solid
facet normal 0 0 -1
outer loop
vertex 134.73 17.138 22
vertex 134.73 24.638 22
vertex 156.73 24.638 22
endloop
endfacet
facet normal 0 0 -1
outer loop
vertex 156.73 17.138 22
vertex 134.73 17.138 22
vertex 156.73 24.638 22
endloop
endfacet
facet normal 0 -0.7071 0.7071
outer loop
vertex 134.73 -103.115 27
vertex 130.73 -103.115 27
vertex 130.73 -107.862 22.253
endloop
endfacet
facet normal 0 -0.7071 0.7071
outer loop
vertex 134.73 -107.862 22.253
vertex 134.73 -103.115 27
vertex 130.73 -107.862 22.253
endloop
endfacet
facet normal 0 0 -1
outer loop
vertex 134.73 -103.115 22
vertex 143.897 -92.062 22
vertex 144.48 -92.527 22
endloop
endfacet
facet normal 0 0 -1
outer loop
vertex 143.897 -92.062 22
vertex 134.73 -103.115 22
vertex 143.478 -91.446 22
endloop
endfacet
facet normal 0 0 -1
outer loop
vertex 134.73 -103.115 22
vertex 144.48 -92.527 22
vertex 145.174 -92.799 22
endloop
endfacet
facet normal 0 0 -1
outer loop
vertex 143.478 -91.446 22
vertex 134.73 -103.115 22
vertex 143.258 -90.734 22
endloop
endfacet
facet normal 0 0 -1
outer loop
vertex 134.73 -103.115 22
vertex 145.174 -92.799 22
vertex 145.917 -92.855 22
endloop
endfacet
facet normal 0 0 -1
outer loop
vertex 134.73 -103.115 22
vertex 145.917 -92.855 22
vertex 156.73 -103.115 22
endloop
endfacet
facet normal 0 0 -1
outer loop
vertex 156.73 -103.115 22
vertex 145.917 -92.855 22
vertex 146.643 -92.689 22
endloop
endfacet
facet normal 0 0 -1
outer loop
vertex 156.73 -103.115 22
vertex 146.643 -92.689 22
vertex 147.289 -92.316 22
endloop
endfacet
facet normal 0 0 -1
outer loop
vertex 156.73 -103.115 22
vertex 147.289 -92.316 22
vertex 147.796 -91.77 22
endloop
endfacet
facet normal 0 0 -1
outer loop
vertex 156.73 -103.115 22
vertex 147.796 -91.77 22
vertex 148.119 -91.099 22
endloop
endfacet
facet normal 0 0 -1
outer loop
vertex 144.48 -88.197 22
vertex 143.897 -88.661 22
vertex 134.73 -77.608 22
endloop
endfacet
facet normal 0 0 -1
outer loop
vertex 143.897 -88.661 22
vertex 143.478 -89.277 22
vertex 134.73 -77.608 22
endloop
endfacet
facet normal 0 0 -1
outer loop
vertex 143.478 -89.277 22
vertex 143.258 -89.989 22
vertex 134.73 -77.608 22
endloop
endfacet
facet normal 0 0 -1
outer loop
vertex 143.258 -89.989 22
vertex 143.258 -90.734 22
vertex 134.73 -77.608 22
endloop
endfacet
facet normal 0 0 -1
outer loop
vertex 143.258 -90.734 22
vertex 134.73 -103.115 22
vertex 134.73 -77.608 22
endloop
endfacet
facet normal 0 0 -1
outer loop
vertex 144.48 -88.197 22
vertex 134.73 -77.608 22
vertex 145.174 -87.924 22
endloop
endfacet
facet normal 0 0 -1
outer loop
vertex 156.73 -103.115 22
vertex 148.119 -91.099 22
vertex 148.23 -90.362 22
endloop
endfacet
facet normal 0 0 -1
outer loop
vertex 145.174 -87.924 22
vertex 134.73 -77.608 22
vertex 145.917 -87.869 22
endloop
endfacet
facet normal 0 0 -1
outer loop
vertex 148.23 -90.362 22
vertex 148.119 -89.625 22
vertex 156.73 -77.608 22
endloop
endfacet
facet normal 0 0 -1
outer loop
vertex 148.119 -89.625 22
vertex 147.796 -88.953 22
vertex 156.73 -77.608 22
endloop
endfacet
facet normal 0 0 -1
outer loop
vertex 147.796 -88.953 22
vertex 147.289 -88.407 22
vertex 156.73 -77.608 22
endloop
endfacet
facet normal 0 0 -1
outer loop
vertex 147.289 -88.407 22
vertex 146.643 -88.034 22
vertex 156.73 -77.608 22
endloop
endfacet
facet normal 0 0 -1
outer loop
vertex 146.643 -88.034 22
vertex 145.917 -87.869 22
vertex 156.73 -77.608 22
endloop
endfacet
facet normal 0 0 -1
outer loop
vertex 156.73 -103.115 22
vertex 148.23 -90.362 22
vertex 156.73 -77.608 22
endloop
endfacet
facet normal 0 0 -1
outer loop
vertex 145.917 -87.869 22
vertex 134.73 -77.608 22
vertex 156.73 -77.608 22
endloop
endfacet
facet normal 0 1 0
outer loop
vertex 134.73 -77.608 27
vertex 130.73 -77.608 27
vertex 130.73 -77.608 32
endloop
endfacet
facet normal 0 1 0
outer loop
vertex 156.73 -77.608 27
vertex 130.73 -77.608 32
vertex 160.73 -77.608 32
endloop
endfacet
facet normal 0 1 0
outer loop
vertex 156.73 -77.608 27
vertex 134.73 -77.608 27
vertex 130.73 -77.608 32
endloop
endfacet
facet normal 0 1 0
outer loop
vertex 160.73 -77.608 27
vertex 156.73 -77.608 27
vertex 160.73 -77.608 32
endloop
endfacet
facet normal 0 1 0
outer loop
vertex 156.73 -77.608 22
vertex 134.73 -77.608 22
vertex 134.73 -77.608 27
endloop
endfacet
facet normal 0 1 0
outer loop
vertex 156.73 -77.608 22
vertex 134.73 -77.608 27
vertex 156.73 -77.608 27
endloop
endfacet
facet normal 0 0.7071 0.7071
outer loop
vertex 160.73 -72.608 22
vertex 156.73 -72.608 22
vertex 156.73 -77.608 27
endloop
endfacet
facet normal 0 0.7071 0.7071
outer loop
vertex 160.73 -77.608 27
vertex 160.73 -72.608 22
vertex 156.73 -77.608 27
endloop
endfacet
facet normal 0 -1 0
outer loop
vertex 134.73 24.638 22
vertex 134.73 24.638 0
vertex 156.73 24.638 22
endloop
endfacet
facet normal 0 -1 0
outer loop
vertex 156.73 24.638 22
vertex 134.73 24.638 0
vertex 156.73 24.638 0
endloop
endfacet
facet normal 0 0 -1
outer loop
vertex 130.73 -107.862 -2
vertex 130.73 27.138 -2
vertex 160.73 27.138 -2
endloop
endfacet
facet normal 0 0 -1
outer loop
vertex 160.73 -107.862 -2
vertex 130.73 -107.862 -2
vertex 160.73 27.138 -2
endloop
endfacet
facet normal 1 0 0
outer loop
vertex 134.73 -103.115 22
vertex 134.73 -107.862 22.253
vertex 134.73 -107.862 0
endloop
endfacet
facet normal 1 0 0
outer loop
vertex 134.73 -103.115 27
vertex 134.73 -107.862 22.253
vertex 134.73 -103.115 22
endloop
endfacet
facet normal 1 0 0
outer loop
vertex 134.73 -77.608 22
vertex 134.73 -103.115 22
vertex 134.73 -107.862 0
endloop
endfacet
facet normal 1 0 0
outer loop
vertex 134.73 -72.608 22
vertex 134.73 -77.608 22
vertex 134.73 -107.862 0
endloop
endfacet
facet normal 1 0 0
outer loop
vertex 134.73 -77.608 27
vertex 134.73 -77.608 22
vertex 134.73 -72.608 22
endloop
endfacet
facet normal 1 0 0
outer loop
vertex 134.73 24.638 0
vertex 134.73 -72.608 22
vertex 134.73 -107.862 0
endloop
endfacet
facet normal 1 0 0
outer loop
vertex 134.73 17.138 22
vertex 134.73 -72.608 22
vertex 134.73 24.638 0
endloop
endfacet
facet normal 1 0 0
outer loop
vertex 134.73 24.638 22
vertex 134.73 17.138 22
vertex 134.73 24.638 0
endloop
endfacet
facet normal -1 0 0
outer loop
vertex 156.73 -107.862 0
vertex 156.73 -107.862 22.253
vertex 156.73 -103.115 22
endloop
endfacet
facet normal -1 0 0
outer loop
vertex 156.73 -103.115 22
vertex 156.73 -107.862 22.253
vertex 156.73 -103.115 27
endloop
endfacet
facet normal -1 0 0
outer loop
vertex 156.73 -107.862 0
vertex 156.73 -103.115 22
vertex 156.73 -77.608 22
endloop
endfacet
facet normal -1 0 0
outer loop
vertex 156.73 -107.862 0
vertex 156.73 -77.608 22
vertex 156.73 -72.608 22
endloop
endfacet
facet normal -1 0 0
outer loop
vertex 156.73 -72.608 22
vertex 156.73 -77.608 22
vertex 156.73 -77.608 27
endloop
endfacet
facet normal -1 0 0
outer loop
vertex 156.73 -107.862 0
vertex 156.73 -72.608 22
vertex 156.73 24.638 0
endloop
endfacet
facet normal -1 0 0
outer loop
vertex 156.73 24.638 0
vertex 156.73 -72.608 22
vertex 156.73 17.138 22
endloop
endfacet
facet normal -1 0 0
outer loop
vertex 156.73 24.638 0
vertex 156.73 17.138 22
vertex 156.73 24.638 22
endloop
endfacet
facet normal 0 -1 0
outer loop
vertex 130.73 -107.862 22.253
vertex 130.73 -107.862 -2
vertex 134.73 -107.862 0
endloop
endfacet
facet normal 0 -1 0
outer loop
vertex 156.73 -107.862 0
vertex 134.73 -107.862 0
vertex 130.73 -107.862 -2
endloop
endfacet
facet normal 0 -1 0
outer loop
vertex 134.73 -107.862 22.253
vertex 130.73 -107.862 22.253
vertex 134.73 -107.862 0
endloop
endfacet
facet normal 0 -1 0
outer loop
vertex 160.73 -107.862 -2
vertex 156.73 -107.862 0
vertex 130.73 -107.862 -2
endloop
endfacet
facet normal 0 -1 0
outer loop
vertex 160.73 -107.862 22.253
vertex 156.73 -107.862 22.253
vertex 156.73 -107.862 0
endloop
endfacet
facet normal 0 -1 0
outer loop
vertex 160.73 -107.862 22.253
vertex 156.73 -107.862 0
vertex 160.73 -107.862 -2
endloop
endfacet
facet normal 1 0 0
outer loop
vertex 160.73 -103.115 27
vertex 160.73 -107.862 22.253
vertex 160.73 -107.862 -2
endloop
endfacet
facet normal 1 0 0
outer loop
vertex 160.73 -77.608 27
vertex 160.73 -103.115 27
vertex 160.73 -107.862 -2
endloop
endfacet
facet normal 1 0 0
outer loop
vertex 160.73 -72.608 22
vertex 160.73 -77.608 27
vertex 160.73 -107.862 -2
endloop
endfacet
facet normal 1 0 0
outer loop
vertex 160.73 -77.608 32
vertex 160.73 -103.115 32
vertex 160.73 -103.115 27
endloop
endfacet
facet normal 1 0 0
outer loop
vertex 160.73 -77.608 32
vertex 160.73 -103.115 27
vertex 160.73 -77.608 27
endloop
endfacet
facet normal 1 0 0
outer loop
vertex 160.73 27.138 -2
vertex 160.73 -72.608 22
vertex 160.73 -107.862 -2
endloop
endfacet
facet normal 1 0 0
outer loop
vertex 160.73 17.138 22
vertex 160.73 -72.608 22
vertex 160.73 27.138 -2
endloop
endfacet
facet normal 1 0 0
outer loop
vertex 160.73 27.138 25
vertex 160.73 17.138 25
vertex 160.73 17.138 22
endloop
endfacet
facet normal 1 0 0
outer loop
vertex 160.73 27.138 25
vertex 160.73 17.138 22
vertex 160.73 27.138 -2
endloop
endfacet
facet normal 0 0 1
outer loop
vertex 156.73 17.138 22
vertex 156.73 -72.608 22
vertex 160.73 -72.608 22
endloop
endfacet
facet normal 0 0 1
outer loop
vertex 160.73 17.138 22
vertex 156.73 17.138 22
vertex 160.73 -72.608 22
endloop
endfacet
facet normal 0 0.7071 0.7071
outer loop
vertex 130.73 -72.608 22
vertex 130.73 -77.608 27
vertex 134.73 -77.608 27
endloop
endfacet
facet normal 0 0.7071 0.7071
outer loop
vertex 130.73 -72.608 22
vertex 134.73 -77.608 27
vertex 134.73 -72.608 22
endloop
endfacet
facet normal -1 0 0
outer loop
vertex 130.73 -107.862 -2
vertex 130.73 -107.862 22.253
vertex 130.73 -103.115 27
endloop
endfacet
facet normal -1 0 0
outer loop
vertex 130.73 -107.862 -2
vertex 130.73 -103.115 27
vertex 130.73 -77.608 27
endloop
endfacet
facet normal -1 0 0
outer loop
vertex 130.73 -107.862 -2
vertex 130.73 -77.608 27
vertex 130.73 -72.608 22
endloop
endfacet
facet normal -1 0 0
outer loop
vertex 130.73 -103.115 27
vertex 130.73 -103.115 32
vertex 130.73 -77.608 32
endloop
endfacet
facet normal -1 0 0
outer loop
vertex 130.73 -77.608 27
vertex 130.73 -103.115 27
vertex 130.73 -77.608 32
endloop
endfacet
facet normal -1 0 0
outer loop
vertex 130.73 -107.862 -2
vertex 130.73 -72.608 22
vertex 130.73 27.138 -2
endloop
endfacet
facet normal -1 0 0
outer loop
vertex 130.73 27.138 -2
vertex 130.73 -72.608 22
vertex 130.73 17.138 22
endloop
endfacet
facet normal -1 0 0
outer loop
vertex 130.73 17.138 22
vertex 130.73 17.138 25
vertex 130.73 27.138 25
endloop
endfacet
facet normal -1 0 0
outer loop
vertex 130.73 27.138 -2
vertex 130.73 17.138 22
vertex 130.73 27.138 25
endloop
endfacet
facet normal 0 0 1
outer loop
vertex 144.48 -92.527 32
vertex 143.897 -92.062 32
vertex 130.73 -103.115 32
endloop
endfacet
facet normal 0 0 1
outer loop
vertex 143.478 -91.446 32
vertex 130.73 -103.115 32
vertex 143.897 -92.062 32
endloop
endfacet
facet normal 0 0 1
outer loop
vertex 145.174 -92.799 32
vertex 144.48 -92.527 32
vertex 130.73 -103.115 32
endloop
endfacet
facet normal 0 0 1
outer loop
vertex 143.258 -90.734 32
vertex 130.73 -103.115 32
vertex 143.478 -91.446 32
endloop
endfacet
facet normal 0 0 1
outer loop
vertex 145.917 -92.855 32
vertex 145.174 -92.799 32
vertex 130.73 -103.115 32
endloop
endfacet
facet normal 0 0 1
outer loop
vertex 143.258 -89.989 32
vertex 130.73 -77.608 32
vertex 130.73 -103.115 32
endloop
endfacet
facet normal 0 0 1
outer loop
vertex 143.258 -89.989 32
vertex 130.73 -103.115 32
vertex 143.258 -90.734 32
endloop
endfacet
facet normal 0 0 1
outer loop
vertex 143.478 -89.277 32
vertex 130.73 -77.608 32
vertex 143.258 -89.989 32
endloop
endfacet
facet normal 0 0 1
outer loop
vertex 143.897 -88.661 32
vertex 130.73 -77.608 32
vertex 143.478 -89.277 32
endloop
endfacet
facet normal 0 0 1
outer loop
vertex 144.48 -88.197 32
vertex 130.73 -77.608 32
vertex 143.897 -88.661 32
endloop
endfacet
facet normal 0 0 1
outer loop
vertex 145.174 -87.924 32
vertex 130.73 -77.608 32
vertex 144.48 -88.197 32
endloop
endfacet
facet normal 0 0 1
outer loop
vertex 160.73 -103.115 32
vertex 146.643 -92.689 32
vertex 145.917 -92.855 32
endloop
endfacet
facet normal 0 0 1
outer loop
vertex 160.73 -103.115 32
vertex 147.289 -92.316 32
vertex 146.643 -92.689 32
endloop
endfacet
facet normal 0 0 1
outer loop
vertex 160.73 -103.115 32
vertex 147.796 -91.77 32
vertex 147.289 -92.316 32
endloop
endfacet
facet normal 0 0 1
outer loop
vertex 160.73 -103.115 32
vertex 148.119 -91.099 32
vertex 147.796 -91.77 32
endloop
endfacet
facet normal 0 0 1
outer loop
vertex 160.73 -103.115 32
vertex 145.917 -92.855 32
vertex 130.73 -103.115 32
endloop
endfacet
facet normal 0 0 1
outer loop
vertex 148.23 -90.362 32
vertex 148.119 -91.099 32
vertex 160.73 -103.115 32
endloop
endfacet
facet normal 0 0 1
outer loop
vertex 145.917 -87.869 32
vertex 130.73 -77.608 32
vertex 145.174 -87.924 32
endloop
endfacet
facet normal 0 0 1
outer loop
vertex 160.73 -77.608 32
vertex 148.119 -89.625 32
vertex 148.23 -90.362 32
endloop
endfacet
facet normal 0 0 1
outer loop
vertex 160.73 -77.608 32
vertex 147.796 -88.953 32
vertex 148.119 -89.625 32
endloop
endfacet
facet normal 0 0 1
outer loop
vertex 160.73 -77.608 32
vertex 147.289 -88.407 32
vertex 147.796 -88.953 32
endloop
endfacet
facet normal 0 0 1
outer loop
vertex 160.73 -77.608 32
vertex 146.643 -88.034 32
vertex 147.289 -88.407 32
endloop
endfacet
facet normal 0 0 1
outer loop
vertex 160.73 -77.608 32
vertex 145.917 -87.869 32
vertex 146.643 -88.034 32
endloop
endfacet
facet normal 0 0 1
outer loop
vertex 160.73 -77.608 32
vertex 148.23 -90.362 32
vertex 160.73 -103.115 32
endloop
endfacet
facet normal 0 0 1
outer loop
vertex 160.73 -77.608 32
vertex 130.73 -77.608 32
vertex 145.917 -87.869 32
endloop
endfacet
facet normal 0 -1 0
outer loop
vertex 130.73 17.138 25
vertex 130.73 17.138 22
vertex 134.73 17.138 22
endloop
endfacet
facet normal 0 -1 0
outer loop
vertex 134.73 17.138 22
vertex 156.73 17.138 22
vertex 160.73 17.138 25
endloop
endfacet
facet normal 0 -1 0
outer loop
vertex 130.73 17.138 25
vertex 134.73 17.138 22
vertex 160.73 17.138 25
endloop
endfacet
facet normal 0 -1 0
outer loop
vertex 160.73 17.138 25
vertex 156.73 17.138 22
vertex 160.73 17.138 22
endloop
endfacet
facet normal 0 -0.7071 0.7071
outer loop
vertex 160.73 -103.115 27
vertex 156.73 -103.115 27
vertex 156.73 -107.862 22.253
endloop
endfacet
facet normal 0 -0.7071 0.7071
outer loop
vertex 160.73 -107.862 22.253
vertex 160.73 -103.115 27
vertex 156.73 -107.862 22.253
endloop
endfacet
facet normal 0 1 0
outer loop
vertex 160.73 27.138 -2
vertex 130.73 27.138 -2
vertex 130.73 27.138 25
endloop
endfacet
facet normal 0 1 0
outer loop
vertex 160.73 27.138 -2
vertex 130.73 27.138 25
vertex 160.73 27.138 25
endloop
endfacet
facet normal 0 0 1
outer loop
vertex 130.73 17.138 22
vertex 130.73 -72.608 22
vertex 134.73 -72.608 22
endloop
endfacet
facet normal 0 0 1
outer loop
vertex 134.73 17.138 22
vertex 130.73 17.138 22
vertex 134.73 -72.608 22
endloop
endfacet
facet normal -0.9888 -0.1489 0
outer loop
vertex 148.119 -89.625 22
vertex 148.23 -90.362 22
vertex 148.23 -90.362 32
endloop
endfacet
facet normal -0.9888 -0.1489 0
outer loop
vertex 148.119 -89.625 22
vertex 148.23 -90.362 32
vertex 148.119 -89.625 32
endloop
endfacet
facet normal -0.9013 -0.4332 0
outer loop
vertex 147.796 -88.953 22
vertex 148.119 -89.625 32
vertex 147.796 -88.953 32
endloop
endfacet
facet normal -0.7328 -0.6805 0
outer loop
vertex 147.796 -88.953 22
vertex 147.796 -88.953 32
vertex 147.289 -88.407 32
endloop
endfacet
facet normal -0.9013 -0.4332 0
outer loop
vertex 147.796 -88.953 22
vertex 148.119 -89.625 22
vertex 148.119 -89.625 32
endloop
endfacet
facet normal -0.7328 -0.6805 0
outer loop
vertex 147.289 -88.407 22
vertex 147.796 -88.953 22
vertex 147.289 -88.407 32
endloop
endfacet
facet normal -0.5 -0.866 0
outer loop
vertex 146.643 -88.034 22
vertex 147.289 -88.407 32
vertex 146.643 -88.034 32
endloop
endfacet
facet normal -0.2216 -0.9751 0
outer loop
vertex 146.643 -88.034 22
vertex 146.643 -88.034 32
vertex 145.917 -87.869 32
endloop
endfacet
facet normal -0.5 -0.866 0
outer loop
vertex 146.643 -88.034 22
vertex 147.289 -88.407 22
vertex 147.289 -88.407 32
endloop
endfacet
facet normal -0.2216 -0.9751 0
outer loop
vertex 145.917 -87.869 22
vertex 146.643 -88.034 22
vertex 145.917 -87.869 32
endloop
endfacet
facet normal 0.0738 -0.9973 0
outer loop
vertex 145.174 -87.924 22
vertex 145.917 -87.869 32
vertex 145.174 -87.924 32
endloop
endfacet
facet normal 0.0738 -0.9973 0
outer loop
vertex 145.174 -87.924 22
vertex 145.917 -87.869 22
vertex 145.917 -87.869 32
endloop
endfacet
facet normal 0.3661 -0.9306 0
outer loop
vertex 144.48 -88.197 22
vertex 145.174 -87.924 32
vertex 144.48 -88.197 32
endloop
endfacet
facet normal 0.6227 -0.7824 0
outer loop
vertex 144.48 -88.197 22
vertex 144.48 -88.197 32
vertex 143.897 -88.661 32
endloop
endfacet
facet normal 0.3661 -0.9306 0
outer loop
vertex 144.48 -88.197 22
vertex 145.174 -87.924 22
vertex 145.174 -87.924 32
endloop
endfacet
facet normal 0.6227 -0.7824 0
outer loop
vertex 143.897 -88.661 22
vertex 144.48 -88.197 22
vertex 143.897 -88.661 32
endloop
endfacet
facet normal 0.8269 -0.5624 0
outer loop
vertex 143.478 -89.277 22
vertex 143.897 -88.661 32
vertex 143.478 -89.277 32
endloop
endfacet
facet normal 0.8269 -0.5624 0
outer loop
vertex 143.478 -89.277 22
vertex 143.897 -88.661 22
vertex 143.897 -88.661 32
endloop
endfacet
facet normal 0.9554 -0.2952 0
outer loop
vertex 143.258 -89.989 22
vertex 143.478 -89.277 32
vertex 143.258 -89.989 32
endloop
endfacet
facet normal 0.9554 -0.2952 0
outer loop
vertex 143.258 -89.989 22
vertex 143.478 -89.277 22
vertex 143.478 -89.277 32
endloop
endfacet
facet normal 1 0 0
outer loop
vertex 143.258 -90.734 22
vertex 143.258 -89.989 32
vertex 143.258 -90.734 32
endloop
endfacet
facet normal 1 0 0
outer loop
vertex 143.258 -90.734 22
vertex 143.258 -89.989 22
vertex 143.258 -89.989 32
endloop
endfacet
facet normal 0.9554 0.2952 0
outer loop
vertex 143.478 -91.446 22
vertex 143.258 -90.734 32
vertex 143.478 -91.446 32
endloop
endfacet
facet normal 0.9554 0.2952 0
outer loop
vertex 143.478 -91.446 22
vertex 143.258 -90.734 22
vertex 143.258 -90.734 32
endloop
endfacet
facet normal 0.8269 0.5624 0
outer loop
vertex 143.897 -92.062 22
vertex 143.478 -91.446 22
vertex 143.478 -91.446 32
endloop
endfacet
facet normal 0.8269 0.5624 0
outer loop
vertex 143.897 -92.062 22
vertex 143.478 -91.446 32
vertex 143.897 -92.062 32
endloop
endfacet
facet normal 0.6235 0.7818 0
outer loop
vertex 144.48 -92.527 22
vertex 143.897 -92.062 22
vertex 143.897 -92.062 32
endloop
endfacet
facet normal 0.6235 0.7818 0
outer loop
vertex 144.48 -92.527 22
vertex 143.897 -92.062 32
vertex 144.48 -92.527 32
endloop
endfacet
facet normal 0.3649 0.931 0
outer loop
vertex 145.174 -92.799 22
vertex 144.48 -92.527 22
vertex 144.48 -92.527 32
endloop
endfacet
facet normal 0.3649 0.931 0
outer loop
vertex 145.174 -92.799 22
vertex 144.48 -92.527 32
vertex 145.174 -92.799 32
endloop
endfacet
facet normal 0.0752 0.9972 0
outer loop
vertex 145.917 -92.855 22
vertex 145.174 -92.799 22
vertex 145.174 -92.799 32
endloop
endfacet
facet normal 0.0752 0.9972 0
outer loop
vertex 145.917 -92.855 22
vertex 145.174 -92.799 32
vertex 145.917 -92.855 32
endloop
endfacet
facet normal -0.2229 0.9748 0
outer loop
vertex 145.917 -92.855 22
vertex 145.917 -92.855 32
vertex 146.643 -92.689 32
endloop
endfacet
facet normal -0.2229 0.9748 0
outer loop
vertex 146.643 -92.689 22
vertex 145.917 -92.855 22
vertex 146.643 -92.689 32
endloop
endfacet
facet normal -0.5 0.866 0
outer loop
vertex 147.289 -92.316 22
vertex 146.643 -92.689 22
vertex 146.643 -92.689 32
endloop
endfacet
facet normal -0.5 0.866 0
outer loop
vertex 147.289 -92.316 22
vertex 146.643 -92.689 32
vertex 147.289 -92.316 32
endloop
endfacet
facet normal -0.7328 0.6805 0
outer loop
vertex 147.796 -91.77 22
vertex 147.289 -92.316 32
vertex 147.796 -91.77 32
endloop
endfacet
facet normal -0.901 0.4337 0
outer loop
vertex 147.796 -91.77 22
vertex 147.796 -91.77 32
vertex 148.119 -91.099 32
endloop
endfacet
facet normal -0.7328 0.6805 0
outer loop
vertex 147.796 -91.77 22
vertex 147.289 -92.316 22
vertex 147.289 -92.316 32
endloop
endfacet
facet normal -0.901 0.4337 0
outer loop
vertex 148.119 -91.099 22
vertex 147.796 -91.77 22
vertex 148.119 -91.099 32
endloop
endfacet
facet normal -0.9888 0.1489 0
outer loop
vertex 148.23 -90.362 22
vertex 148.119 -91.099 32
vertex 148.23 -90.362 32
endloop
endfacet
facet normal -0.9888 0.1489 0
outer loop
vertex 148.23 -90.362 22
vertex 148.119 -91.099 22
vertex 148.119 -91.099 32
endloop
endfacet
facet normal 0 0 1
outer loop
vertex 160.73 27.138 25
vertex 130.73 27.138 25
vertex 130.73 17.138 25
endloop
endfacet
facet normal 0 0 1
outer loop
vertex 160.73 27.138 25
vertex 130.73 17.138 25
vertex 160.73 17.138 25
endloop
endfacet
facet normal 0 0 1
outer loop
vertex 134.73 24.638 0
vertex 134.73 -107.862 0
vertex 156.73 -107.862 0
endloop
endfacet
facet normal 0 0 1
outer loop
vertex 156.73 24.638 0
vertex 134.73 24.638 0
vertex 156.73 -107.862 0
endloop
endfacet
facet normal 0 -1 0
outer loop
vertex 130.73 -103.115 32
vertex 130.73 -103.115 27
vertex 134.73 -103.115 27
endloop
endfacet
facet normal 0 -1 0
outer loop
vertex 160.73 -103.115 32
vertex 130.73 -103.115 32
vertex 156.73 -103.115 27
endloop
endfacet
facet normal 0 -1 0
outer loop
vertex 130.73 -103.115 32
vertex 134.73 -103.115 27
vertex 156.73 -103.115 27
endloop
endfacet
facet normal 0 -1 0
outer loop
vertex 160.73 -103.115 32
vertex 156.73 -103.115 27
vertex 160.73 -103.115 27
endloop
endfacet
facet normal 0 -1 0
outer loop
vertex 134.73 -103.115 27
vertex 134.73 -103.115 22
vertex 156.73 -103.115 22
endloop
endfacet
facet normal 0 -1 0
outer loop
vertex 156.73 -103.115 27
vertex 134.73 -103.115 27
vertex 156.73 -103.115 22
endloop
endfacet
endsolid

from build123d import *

# Parameters (mm, degrees)
F1_DEPTH     = 22
F2_W         = 30
F2_H         = 135
F3_DEPTH     = 2
F4_W         = 30
F4_H         = 25.5063175828
F4_R         = 2.5
F5_DEPTH     = 10
F6_W         = 30
F6_H         = 10
F7_DEPTH     = 3
F8_T1_DEPTH  = 4
F8_T3_DEPTH  = 4
F8_T8_DEPTH  = 4
F8_T13_DEPTH = 4


# Not quite as in the source:
# - a fillet or chamfer that OpenCascade refuses, or shapes differently, is made with other operations: its cross-section is extruded or revolved along the edge and cut away or added


with BuildPart() as f1:
    # F0 (on Top) → F1 (new body)
    with BuildSketch(Plane.XY):
        Polygon((160.7300297916, 27.1383413836), (130.7300297916, 27.1383413836), (130.7300297916, -107.8616586164), (134.7300297916, -107.8616586164), (134.7300297916, -105.3616586164), (134.7300297916, 24.6383413836), (156.7300297916, 24.6383413836), (156.7300297916, -105.3616586164), (156.7300297916, -107.8616586164), (160.7300297916, -107.8616586164), align=None)
    extrude(amount=F1_DEPTH)

    # F2 (on face) → F3 (join)
    with BuildSketch(Plane(origin=(0, 0, 0), x_dir=(1, 0, 0), z_dir=(0, 0, -1))):
        with Locations((145.7300297916, 40.3616586164)):
            Rectangle(F2_W, F2_H)
    extrude(amount=F3_DEPTH)

    # F4 (on face) → F5 (join)
    with BuildSketch(Plane.XY.offset(22)):
        with Locations((145.7300297916, -90.3616586164)):
            Rectangle(F4_W, F4_H)
        with Locations((145.7300297916, -90.3616586164)):
            Circle(F4_R, mode=Mode.SUBTRACT)
    extrude(amount=F5_DEPTH)

    # F6 (on face) → F7 (join)
    with BuildSketch(Plane.XY.offset(22)):
        with Locations((145.7300297916, 22.1383413836)):
            Rectangle(F6_W, F6_H)
    extrude(amount=F7_DEPTH)

    # F8: chamfer of 5 on 4 edges, made by hand

    # F8_s2 → F8_t1 (join)
    with BuildSketch(Plane.YZ.offset(156.7300297916)):
        Polygon((-72.608499825, 22), (-77.608499825, 27), (-77.608499825, 22), align=None)
    extrude(amount=F8_T1_DEPTH)

    # F8_s4 → F8_t3 (join)
    with BuildSketch(Plane.YZ.offset(130.7300297916)):
        Polygon((-77.608499825, 27), (-72.608499825, 22), (-77.608499825, 22), align=None)
    extrude(amount=F8_T3_DEPTH)


with BuildPart() as f8_tool6:
    # F8_s7 → F8_t8 (new body)
    with BuildSketch(Plane.YZ.offset(130.7300297916)):
        Polygon((-103.1148174078, 27), (-108.1148174078, 22), (-103.1148174078, 22), align=None)
    extrude(amount=F8_T8_DEPTH)

    split(bisect_by=Plane.XZ.offset(107.8616586164), keep=Keep.BOTTOM)


with BuildPart() as f1_1:
    add(f1.part)

    # F8_t5: union F8_tool6
    add(f8_tool6.part)


with BuildPart() as f8_tool11:
    # F8_s12 → F8_t13 (new body)
    with BuildSketch(Plane.YZ.offset(156.7300297916)):
        Polygon((-103.1148174078, 27), (-108.1148174078, 22), (-103.1148174078, 22), align=None)
    extrude(amount=F8_T13_DEPTH)

    split(bisect_by=Plane.XZ.offset(107.8616586164), keep=Keep.BOTTOM)


with BuildPart() as f1_2:
    add(f1_1.part)

    # F8_t10: union F8_tool11
    add(f8_tool11.part)


solid = f1_2.part
